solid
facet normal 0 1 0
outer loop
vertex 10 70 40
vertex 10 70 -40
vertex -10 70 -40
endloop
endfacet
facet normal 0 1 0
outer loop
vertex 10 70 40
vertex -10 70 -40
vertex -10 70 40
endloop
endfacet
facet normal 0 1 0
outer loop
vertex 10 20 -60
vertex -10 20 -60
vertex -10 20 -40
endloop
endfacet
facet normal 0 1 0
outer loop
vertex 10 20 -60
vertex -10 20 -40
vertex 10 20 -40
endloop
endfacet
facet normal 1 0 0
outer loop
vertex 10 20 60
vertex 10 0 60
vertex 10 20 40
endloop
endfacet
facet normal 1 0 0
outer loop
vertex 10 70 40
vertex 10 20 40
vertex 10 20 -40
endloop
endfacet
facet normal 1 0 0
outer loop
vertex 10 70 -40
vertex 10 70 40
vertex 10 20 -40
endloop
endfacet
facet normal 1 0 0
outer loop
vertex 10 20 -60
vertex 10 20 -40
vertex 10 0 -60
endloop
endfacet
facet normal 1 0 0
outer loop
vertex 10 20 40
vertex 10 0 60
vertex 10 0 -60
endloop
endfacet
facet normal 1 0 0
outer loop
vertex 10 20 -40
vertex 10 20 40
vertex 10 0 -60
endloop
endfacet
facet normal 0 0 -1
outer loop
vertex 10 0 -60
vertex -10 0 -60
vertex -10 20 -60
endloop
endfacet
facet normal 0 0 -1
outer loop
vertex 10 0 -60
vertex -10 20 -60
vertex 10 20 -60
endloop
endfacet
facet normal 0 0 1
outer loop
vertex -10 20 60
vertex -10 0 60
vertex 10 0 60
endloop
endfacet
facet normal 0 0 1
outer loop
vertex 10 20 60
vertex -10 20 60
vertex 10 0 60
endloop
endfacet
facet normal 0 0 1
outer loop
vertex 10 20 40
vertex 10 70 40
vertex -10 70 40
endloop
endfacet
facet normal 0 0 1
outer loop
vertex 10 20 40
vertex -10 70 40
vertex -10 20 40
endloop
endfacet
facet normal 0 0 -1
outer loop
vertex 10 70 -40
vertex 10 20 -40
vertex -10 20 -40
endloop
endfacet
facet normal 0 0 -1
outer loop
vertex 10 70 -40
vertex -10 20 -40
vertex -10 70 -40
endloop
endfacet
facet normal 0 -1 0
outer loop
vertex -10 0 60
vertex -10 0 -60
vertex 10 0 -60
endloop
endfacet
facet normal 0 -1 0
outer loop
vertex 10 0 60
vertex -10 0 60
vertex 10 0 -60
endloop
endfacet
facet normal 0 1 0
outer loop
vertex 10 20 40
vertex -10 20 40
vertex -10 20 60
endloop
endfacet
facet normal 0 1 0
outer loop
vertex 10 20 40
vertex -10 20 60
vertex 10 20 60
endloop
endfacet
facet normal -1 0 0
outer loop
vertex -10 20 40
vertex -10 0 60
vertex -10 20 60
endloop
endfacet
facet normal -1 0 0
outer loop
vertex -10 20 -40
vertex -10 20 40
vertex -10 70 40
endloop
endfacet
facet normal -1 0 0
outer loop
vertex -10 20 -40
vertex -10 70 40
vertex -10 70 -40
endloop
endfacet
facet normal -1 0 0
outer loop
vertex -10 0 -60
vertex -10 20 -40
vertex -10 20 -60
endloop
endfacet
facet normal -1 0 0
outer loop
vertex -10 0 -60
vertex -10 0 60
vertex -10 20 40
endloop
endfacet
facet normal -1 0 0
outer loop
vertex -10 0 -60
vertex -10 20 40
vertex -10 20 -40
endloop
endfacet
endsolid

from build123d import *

# Parameters (mm, degrees)
SKETCH_1_W      = 20
SKETCH_1_H      = 120
EXTRUDE_1_DEPTH = 20
EXTRUDE_2_DEPTH = 20


with BuildPart() as part:
    # 草图1 → 凸台-拉伸1 (new body)
    with BuildSketch(Plane(origin=(0, 0, 0), x_dir=(1, 0, 0), z_dir=(0, 1, 0))):
        Rectangle(SKETCH_1_W, SKETCH_1_H)
    extrude(amount=EXTRUDE_1_DEPTH)

    # 草图2 → 凸台-拉伸2 (add)
    with BuildSketch(Plane(origin=(10, 0, 0), x_dir=(0, 0, -1), z_dir=(1, 0, 0))):
        Polygon((0, 20), (40, 20), (40, 70), (-40, 70), (-40, 20), align=None)
    extrude(amount=-EXTRUDE_2_DEPTH)


solid = part.part
